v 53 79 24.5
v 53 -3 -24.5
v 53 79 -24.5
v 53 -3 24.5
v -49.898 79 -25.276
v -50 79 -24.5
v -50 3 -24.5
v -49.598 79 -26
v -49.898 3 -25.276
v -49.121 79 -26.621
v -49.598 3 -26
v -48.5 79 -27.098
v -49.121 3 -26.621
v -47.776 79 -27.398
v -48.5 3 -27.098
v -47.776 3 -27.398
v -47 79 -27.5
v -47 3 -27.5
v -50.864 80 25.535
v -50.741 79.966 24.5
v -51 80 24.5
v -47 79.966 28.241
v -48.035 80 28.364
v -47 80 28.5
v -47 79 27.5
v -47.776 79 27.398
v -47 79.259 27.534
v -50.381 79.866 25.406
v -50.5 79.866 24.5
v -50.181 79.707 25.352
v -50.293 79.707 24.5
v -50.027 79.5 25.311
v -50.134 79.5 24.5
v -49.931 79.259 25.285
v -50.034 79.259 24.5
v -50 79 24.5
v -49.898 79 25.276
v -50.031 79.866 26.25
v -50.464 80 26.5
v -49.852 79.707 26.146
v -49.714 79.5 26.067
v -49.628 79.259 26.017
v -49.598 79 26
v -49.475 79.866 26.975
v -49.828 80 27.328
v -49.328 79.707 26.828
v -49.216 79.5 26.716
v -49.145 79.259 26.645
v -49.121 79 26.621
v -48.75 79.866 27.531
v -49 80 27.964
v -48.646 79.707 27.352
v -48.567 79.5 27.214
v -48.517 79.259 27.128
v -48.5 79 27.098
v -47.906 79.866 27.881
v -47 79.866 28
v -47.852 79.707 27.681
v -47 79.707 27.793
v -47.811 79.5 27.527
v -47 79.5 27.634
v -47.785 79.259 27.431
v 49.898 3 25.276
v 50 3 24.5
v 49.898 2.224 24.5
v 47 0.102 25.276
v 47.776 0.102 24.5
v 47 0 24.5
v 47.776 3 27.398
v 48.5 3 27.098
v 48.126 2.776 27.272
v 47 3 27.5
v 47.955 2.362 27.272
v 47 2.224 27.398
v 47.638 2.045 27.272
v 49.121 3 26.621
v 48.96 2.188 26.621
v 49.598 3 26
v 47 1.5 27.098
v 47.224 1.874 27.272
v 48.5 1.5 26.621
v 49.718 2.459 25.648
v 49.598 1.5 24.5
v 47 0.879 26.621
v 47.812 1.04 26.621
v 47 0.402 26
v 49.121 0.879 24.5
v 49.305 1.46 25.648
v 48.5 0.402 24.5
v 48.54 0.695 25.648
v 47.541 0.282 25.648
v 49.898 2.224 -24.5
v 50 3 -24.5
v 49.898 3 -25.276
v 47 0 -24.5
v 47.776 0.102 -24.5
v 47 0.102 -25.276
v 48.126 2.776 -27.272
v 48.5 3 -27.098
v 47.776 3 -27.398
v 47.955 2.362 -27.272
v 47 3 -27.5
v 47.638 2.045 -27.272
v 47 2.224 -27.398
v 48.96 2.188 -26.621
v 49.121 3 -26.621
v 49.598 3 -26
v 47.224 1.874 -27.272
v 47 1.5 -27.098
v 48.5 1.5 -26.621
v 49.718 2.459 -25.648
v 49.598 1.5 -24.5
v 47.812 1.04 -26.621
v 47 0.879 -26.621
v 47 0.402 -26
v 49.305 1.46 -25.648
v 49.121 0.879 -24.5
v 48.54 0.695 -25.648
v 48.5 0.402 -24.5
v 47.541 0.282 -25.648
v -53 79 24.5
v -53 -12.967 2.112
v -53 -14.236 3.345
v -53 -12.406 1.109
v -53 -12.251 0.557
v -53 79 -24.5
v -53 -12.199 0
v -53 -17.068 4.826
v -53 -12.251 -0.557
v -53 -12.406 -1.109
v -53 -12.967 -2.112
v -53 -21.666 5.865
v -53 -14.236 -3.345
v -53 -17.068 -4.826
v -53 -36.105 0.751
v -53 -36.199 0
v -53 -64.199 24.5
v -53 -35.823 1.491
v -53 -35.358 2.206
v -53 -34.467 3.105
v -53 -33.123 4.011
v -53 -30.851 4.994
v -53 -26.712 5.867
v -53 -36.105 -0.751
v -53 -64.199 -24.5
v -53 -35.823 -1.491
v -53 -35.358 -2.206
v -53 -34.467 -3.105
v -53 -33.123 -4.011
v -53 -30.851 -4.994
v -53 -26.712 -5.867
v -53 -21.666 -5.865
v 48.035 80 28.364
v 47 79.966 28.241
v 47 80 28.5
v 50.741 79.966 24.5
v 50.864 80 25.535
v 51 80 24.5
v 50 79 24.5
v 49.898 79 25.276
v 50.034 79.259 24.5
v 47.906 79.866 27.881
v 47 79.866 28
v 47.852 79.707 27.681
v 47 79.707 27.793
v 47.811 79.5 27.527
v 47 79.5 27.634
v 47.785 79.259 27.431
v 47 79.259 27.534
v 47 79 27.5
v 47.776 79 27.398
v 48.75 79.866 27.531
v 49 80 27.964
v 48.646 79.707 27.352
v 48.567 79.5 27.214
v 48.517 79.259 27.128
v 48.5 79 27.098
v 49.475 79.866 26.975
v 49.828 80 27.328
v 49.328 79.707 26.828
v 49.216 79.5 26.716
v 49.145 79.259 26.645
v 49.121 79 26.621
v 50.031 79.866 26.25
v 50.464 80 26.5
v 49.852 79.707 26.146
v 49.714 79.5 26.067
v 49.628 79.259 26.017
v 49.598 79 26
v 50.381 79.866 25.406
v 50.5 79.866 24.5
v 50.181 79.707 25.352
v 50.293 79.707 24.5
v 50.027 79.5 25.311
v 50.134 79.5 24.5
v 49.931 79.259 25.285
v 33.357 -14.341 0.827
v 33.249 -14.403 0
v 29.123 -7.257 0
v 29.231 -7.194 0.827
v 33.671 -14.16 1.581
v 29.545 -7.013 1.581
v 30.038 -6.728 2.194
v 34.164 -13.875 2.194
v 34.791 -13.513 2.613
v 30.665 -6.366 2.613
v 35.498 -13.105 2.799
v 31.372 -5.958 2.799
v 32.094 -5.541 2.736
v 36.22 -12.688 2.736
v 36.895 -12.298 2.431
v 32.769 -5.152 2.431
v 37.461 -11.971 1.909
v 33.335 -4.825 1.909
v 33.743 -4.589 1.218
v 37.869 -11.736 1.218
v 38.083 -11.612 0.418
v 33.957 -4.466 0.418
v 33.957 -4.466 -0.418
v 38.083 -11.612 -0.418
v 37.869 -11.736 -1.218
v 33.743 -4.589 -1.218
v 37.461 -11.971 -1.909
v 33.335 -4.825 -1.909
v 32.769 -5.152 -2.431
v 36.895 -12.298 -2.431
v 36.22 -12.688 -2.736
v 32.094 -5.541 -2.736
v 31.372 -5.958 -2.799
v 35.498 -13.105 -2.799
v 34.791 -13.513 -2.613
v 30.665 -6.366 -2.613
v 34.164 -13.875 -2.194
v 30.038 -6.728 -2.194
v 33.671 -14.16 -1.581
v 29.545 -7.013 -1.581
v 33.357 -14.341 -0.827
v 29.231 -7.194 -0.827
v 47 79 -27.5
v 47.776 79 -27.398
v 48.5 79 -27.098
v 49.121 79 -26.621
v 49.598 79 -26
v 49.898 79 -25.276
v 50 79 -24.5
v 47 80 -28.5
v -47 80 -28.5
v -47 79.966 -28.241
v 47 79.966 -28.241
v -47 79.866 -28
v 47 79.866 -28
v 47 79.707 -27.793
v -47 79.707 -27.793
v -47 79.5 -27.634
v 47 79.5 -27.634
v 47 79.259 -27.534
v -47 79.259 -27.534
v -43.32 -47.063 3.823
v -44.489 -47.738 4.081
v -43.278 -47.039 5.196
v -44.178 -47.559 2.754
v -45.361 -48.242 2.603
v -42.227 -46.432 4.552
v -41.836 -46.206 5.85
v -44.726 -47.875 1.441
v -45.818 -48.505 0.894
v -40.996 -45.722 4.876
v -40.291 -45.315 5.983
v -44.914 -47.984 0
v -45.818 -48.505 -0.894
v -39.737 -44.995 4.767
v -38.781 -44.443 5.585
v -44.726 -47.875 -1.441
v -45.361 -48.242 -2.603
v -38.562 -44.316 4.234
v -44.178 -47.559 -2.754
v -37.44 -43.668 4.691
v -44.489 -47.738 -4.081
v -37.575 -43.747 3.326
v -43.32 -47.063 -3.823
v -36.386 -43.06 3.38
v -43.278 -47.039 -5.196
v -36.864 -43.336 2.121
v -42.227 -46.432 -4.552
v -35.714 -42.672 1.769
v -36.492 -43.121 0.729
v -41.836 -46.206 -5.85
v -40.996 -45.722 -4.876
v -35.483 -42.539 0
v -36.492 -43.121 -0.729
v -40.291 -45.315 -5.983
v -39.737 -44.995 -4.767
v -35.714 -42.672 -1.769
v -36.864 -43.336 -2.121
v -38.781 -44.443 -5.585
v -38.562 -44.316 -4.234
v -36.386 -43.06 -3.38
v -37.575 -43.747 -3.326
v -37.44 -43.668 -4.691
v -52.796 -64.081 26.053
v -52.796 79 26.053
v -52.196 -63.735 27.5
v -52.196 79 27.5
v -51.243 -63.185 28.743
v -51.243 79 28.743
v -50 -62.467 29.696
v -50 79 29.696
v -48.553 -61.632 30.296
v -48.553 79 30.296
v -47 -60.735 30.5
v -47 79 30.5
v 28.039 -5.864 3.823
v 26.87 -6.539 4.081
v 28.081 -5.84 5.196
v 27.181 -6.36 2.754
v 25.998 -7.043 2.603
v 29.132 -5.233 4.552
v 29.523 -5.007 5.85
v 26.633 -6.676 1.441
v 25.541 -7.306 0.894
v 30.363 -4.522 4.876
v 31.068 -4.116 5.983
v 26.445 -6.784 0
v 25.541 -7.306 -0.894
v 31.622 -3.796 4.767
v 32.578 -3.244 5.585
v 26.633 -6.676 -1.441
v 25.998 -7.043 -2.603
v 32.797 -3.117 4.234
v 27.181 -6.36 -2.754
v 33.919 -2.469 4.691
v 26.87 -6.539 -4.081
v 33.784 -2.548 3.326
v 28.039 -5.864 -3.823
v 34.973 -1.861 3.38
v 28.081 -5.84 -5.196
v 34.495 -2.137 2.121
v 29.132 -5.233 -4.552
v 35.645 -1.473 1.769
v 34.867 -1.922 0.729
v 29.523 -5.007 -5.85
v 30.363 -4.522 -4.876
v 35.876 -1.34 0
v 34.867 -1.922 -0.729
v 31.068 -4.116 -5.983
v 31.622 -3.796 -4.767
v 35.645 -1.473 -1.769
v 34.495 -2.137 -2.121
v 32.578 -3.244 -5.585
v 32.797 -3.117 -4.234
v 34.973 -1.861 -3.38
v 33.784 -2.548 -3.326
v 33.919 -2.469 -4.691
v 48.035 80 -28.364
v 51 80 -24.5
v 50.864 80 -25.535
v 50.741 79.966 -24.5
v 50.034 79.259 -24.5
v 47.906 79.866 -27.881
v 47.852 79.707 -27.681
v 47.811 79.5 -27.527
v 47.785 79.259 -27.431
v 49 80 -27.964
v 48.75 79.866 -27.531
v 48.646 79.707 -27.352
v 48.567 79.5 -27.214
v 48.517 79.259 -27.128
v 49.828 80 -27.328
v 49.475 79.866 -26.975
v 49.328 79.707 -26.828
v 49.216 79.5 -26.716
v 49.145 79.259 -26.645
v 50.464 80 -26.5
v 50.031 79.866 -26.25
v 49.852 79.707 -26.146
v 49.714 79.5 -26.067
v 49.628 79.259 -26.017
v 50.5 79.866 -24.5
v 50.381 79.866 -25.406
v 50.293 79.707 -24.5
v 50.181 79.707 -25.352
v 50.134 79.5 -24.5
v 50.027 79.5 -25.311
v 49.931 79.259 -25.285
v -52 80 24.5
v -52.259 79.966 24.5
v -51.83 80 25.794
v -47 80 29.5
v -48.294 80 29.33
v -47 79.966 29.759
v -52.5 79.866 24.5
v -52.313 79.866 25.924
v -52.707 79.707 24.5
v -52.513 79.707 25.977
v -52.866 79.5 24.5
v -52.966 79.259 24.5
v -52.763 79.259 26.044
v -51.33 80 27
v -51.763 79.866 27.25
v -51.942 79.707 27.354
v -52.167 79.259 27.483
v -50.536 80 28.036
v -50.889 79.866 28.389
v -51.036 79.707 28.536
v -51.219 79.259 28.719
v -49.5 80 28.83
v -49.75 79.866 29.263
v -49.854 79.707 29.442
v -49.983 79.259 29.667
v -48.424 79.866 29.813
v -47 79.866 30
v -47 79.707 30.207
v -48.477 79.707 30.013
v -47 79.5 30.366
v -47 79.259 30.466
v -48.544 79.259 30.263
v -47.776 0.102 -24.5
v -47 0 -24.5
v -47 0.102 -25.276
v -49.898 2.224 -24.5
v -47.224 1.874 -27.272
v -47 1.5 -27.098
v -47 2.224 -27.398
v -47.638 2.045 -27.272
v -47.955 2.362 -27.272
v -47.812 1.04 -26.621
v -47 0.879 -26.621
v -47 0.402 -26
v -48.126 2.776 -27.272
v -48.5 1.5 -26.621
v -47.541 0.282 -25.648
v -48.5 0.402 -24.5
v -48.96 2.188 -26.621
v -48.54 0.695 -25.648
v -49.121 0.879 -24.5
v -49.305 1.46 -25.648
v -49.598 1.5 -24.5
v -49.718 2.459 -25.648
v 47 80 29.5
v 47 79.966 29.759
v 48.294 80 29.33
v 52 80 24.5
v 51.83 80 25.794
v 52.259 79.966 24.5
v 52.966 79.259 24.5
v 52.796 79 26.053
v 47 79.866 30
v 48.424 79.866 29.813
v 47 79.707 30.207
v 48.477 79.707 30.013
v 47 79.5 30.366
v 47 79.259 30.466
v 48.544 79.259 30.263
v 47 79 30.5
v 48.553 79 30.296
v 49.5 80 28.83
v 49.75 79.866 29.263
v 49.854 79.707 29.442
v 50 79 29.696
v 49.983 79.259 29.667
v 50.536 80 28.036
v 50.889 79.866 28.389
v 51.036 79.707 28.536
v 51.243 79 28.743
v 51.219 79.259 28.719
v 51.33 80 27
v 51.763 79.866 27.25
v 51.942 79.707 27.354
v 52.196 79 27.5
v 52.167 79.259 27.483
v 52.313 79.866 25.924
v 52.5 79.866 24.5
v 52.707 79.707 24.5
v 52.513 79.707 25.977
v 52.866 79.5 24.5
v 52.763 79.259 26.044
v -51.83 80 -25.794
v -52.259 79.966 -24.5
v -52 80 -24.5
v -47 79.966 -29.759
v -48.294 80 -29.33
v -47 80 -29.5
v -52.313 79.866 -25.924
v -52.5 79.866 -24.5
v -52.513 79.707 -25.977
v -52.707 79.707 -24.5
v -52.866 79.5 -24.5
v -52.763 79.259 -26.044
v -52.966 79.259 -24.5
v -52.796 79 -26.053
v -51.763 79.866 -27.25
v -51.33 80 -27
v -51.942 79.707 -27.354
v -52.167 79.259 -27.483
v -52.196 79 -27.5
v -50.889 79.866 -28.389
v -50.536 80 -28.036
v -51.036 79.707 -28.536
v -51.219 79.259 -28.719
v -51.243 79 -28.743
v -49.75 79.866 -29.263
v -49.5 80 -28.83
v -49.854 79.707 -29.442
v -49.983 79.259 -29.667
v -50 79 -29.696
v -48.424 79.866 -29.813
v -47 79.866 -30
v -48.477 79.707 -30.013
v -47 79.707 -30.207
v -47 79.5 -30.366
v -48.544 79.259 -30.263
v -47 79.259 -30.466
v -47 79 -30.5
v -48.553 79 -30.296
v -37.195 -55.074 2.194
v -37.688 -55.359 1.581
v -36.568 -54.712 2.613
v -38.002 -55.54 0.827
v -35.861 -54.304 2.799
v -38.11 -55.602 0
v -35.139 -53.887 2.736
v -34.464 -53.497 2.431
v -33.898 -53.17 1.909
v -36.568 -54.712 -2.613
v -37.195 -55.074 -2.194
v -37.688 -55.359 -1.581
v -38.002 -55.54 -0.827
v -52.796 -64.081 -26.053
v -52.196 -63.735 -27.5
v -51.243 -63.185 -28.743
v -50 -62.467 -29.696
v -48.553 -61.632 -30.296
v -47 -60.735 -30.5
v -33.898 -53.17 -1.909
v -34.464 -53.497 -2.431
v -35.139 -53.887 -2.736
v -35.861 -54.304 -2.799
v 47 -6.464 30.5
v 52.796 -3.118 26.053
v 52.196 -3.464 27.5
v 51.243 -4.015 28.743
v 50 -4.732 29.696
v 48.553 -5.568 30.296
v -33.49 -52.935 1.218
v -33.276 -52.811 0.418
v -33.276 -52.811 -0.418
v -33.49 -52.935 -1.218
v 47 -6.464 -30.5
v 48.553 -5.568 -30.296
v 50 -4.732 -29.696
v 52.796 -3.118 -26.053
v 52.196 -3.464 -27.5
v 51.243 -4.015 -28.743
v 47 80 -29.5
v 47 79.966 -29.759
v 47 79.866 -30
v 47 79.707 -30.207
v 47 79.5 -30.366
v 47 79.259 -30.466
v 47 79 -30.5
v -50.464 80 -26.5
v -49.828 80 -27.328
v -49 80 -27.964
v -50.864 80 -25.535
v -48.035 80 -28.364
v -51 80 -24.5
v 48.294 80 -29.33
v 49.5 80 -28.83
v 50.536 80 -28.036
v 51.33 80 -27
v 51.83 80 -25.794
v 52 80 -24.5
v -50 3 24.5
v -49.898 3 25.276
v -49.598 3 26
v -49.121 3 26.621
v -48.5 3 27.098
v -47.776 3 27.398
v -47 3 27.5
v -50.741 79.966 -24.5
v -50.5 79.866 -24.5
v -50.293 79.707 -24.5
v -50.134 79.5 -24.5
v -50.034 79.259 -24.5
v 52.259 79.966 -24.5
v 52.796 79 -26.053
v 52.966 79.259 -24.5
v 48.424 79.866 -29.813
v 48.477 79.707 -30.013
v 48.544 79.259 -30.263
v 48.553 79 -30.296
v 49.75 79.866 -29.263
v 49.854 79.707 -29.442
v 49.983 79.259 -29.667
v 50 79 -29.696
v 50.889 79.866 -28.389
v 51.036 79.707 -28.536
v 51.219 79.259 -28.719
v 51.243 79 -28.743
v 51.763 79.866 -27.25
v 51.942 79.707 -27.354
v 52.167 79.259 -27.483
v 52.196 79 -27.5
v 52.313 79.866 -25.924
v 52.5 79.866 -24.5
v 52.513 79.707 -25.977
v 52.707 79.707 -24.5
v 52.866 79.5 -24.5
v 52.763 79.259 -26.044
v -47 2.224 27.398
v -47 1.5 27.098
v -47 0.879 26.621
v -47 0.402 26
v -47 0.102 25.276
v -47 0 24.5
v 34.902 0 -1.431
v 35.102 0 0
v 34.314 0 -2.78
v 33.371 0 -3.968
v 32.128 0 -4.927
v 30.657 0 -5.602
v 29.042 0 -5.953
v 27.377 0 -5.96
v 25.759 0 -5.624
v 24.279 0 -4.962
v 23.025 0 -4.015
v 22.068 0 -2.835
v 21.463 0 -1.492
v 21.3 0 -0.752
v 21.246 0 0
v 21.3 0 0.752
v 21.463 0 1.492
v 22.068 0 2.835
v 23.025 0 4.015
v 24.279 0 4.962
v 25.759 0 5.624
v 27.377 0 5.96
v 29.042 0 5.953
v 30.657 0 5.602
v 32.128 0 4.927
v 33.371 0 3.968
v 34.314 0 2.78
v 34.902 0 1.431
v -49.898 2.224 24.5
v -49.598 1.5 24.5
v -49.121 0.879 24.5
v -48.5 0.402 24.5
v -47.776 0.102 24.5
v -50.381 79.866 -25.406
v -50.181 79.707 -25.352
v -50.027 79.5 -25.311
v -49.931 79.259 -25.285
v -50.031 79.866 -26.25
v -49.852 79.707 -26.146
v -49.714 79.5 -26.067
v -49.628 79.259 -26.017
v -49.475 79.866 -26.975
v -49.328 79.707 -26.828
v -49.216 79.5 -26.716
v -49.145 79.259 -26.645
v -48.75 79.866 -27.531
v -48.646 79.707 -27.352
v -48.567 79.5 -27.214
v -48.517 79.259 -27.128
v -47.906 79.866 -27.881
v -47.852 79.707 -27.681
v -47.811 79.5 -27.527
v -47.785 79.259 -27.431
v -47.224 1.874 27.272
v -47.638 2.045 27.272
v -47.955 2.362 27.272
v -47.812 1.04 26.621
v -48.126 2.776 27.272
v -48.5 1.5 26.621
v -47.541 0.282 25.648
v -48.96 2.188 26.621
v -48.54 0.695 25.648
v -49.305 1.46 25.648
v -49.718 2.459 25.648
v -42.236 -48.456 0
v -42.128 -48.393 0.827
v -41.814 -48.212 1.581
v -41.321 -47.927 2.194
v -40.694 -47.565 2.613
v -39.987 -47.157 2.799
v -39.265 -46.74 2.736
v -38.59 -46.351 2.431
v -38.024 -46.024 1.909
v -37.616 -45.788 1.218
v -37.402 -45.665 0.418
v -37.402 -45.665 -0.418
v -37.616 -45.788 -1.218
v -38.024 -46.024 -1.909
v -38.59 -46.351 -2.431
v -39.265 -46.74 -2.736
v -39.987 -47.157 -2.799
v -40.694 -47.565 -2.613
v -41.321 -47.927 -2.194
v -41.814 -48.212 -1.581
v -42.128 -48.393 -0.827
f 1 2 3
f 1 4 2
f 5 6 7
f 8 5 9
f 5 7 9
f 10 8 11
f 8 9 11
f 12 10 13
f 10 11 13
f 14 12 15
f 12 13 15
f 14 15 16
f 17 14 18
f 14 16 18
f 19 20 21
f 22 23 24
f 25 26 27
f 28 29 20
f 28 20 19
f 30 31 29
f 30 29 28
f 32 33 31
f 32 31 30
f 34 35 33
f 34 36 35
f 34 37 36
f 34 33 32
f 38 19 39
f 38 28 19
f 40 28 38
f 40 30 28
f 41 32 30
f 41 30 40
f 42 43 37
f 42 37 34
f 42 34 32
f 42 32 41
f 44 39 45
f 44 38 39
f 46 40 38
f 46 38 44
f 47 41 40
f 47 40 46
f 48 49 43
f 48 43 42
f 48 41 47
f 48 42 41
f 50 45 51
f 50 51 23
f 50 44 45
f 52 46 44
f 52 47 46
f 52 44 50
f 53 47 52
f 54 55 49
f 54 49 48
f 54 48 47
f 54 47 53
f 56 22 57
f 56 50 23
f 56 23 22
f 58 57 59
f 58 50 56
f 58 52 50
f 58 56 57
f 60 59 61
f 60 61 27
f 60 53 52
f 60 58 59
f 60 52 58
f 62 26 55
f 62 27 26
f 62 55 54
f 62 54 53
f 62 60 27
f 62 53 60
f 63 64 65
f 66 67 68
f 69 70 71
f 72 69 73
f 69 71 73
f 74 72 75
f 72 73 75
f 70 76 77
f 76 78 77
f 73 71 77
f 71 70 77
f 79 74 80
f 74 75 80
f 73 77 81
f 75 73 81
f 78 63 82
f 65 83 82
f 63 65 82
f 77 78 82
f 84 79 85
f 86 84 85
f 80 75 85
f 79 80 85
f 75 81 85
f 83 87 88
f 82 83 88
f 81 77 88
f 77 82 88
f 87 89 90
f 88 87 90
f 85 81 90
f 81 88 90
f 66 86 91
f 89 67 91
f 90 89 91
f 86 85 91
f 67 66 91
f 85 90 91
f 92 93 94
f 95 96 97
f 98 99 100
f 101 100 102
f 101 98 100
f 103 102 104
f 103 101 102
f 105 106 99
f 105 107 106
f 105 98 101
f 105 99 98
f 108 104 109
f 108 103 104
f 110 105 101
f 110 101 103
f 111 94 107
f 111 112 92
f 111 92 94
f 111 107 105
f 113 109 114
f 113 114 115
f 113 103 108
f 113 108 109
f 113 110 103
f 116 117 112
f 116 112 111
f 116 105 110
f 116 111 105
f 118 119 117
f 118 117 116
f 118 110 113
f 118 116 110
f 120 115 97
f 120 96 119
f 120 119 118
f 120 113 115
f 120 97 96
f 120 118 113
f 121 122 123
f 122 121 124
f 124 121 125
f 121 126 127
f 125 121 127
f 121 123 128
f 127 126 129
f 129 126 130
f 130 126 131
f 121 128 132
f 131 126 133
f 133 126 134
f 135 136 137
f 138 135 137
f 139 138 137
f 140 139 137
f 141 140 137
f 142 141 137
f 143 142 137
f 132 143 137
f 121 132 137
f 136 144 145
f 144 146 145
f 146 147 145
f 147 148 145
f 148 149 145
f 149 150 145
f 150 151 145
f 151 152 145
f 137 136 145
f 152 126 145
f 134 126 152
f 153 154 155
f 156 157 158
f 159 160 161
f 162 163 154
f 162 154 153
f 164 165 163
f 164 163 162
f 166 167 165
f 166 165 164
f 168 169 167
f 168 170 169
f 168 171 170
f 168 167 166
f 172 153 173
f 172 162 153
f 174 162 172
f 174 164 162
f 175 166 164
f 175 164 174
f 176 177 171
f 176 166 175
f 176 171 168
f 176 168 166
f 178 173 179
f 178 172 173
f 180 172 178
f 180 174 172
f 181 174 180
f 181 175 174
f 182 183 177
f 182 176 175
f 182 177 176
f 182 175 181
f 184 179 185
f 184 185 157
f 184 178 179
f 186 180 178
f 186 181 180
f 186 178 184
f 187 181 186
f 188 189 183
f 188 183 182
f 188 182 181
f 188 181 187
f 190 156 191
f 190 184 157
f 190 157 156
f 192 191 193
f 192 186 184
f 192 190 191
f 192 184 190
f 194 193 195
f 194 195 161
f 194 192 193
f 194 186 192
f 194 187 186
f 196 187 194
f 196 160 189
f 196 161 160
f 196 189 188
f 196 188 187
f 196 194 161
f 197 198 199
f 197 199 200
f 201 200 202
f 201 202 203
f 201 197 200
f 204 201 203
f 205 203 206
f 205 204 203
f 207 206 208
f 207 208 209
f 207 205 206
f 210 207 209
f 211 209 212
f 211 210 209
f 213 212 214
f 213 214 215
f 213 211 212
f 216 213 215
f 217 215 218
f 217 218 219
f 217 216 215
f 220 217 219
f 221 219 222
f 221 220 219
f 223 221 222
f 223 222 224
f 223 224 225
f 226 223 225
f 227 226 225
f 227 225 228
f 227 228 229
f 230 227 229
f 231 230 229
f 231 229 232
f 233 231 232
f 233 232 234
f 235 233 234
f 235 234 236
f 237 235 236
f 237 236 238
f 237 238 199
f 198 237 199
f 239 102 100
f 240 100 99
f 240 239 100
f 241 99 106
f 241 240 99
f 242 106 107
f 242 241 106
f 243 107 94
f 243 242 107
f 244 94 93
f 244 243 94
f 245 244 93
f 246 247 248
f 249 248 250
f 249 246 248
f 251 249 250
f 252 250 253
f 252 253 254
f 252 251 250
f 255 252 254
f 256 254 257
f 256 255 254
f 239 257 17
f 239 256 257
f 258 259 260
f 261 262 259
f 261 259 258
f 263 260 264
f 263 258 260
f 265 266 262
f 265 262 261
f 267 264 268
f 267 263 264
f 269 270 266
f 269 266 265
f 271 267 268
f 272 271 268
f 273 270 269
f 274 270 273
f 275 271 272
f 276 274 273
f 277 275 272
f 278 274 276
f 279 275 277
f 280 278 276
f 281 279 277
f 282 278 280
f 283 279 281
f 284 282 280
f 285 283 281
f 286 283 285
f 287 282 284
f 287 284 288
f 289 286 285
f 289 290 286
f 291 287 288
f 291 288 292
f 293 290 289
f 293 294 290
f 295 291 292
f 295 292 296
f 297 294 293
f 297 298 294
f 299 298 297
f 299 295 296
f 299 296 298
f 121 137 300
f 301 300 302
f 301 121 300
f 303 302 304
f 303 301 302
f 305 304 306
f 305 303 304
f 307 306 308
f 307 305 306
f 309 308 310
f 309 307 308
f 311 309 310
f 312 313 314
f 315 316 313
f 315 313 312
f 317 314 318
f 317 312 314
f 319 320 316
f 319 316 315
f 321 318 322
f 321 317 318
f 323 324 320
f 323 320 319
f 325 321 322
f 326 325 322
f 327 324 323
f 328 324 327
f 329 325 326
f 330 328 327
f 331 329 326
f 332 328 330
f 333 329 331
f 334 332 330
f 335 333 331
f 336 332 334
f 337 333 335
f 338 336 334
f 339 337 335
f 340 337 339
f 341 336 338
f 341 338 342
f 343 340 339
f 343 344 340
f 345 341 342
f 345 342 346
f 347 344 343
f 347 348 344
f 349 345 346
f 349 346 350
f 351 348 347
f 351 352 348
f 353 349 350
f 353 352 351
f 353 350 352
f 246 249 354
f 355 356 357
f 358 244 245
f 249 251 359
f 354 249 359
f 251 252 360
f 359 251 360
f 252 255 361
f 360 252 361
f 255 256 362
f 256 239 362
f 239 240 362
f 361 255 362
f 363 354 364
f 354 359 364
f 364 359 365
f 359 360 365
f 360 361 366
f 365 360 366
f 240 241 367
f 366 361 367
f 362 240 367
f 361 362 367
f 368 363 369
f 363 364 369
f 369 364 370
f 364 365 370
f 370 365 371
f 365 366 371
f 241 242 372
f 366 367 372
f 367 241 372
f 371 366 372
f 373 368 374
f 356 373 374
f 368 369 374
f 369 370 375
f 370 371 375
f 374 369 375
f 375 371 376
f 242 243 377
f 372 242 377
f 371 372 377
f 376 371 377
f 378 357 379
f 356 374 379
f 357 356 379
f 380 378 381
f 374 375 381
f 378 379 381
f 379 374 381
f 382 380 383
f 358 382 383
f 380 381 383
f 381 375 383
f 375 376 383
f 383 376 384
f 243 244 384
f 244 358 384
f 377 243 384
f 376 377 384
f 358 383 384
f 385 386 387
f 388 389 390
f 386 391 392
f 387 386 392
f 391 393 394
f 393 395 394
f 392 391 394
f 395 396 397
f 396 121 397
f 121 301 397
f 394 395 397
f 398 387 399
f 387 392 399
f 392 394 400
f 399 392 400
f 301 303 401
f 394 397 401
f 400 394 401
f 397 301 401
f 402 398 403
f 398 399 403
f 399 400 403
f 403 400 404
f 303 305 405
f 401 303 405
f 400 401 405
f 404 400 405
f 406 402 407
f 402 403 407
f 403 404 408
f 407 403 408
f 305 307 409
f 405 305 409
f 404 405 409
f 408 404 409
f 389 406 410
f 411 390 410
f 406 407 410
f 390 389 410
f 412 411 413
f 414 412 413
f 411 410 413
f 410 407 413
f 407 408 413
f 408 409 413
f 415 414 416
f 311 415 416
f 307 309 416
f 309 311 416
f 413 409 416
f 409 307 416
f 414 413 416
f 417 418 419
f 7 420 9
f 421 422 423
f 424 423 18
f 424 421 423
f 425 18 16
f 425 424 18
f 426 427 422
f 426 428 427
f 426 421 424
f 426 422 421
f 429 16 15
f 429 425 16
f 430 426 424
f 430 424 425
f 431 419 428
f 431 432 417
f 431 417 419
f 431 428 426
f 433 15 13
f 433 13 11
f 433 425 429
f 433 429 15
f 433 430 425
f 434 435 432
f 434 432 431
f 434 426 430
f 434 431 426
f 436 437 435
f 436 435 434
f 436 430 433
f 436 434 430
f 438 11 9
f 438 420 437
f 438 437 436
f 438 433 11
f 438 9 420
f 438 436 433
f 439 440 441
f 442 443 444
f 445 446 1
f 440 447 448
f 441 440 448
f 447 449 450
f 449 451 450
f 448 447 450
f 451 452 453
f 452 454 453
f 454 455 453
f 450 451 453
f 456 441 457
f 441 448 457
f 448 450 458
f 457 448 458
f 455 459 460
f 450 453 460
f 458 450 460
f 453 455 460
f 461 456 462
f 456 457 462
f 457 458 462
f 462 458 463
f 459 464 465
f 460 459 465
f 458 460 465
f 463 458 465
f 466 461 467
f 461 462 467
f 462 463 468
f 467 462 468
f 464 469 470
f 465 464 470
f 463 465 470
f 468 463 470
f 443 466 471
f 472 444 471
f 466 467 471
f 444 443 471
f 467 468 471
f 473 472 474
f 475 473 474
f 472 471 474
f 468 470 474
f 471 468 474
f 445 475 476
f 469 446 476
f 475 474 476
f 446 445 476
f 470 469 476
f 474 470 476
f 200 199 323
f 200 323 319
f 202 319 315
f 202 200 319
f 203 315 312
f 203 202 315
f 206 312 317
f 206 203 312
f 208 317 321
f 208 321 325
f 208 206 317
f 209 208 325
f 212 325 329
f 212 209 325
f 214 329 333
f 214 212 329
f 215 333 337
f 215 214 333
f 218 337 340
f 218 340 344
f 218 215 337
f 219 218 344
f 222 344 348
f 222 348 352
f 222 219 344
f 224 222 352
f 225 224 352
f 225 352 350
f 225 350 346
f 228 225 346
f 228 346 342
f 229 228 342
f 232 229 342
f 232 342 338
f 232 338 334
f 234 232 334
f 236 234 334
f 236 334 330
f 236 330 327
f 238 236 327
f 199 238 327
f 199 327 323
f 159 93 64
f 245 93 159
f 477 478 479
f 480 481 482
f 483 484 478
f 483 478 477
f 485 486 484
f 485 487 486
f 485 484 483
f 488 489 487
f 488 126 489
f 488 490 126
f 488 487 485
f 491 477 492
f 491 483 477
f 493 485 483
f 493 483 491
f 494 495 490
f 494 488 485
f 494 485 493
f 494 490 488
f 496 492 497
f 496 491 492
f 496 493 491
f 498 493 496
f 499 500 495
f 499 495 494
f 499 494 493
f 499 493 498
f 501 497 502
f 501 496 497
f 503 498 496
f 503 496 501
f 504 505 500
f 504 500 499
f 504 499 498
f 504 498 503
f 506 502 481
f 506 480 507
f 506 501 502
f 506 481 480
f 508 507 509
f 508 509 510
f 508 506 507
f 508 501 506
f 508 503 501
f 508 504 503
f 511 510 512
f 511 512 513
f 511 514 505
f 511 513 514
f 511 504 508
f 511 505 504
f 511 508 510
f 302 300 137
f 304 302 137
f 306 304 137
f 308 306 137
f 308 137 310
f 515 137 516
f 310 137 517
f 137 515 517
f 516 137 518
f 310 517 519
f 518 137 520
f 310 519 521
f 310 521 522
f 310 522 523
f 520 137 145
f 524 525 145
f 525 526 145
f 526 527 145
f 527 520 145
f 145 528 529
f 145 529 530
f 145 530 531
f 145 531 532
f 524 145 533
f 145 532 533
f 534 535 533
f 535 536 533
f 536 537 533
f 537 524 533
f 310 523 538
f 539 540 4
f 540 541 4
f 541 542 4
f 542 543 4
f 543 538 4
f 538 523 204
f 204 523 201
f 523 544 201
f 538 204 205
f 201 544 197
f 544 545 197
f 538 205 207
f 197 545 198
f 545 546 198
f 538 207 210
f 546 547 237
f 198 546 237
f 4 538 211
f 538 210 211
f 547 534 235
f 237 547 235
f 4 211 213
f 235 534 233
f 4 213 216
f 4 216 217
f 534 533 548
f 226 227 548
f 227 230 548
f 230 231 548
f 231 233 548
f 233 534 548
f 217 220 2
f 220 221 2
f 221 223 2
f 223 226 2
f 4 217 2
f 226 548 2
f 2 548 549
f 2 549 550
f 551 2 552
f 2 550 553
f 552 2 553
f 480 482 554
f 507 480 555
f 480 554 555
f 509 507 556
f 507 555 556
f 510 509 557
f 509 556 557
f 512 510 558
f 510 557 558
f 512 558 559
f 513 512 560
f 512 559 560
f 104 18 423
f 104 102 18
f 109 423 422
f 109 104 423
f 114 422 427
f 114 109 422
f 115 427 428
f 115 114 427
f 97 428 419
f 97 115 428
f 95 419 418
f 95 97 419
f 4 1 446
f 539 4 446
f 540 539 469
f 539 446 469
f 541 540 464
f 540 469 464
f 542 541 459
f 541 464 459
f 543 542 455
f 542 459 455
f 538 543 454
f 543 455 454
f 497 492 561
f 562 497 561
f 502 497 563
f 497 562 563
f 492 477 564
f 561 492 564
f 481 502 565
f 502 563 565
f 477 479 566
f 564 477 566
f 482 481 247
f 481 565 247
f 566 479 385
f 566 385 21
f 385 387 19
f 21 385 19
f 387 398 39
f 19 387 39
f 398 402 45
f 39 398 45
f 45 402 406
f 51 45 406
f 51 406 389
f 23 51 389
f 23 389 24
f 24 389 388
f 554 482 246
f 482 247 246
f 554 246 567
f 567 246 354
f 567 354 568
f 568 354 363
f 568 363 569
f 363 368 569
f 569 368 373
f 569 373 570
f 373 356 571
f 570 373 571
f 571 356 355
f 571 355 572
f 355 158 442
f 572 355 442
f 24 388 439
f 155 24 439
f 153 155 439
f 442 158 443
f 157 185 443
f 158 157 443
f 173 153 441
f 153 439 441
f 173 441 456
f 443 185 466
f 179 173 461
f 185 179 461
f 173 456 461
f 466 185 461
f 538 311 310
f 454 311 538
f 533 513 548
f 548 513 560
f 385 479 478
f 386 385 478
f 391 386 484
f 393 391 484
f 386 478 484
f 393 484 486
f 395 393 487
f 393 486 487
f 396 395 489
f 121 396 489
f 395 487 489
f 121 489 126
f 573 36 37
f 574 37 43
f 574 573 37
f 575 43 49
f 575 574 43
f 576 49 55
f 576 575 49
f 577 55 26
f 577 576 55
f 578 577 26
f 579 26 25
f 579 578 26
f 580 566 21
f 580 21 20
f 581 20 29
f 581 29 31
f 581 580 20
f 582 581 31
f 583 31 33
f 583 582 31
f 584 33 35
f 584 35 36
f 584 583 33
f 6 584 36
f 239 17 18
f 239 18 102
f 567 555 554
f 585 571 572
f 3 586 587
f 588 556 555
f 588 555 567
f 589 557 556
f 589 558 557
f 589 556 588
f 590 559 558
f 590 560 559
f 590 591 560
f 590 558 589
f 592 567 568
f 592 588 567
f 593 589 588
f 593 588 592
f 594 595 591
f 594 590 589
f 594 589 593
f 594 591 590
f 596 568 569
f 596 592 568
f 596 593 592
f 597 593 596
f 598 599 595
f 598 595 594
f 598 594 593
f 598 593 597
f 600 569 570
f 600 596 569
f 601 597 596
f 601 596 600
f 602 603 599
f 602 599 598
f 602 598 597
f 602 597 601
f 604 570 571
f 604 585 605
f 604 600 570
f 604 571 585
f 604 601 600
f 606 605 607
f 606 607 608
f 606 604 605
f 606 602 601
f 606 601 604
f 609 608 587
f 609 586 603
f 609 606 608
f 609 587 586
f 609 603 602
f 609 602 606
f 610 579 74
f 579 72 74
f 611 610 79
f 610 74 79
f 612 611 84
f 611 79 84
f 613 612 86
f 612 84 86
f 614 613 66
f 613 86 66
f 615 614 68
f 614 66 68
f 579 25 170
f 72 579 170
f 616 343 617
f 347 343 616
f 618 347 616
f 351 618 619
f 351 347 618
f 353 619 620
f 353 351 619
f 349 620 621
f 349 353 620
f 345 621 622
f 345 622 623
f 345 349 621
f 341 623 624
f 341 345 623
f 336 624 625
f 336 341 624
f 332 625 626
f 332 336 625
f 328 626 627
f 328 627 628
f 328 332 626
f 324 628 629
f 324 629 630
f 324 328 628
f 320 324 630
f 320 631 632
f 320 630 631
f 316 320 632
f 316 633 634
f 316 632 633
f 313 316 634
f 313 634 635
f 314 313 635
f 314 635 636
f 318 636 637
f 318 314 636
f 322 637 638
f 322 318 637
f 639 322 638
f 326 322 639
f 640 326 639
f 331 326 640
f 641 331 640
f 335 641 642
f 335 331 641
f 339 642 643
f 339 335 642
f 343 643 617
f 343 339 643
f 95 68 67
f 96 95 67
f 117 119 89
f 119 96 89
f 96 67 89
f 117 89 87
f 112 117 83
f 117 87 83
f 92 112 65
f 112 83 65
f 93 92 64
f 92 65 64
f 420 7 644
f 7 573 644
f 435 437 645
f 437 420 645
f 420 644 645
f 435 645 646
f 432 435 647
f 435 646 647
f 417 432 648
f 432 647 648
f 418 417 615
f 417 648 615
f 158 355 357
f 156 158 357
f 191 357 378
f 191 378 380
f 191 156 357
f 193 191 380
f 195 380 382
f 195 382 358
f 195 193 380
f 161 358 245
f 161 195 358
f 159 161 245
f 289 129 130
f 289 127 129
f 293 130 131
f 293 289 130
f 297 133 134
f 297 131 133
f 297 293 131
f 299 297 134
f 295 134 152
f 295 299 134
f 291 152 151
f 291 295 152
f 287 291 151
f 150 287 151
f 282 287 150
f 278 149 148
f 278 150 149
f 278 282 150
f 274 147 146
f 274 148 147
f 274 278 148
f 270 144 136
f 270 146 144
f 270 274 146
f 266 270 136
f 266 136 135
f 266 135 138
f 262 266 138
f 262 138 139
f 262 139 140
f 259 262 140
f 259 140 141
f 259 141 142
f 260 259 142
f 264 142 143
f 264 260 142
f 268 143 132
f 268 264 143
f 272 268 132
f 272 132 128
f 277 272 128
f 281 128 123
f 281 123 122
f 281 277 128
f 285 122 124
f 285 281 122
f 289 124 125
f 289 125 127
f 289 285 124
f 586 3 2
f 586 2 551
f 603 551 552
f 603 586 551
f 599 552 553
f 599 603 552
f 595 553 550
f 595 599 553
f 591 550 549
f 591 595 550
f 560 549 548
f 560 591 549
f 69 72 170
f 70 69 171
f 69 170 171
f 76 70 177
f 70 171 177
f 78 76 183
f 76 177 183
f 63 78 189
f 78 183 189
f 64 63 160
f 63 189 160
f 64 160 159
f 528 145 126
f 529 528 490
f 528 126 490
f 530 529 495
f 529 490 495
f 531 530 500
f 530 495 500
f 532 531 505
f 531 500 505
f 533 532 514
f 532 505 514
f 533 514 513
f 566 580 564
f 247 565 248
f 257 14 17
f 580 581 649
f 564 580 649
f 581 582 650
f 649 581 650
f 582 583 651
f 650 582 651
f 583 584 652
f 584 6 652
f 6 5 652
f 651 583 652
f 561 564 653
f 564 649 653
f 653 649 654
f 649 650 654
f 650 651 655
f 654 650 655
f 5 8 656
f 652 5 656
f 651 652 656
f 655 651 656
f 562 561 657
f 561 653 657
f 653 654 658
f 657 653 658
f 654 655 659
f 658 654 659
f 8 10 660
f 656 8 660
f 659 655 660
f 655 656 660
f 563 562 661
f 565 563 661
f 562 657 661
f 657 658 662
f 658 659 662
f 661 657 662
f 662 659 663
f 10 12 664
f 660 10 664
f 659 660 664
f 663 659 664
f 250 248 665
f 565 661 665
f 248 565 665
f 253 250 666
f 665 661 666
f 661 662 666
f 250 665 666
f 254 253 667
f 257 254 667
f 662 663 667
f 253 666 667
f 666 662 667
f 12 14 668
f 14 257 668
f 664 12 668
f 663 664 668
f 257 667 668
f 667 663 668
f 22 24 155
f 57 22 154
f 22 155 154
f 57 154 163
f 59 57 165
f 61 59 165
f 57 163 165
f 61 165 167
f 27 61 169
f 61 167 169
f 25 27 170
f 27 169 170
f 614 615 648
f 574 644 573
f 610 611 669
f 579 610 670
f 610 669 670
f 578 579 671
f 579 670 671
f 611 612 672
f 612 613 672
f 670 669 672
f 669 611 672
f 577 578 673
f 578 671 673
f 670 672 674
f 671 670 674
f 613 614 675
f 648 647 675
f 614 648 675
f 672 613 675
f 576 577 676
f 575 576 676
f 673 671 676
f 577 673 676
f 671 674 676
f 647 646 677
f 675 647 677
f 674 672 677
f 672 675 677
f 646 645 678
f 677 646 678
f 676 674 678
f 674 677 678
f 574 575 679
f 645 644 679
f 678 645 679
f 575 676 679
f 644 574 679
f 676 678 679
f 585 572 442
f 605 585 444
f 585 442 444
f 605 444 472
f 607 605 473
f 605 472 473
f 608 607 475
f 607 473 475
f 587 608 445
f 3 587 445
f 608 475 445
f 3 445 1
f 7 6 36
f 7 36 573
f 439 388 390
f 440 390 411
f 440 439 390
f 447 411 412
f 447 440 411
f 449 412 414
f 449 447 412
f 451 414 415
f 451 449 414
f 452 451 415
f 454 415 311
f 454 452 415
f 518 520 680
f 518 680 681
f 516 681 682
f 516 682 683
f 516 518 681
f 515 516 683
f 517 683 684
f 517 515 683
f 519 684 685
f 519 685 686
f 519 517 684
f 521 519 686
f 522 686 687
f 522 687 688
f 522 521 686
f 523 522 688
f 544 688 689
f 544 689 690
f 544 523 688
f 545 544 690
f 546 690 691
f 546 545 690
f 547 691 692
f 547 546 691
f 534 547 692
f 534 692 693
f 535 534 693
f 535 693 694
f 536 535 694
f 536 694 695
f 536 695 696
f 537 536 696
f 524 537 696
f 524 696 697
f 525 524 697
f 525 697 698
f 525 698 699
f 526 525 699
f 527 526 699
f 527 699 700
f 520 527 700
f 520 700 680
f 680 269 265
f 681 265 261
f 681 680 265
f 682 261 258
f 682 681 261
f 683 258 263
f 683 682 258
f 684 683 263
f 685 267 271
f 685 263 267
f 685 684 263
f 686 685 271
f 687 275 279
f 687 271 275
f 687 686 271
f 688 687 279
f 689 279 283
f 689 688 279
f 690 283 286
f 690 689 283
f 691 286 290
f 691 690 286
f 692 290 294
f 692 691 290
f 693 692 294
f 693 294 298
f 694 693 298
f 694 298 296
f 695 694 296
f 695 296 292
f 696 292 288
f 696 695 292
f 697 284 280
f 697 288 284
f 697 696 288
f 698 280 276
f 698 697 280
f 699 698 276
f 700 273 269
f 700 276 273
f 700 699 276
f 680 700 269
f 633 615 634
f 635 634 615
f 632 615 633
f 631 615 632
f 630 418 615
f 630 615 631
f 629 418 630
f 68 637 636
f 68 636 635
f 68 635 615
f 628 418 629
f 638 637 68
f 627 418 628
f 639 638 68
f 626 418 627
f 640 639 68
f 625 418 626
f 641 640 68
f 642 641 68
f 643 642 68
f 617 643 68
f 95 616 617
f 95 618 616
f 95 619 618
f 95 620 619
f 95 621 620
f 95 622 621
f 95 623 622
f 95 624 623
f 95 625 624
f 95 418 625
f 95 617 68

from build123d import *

# Parameters (mm, degrees)
BOSS_EXTRUDE1_DEPTH                                = 27.5
SKETCH3_W                                          = 106
SKETCH3_H                                          = 83
CUT_EXTRUDE1_DEPTH                                 = 28.5
SKETCH4_W                                          = 106
SKETCH4_H                                          = 83
BOSS_EXTRUDE2_DEPTH                                = 3
BOSS_EXTRUDE3_DEPTH                                = 30.5
FILLET1_R                                          = 3
FILLET2_R                                          = 6
FILLET3_R                                          = 1
CUT_EXTRUDE3_START                                 = -10
SKETCH8_R                                          = 6
CUT_EXTRUDE3_DEPTH                                 = 115.880108514
CSK_FOR_10_FLAT_HEAD_MACHINE_SCREW_100_D           = 5.6134
CSK_FOR_10_FLAT_HEAD_MACHINE_SCREW_100_CSINK_D     = 9.779
CSK_FOR_10_FLAT_HEAD_MACHINE_SCREW_100_CSINK_ANGLE = 100


with BuildPart() as part:
    # Sketch1 → Boss-Extrude1 (new body, symmetric)
    with BuildSketch(Plane.XY):
        Polygon((-53, 80), (-50, 80), (-50, 0), (50, 0), (50, 80), (53, 80), (53, -3), (-53, -3), align=None)
    extrude(amount=BOSS_EXTRUDE1_DEPTH, both=True)

    # Sketch3 → Cut-Extrude1 (cut, through all)
    with BuildSketch(Plane.XY):
        with Locations((0, 38.5)):
            Rectangle(SKETCH3_W, SKETCH3_H)
    extrude(amount=-CUT_EXTRUDE1_DEPTH, mode=Mode.SUBTRACT)

    # Sketch4 → Boss-Extrude2 (add)
    with BuildSketch(Plane.XY.offset(27.5)):
        with Locations((0, 38.5)):
            Rectangle(SKETCH4_W, SKETCH4_H)
    extrude(amount=BOSS_EXTRUDE2_DEPTH)

    # Sketch5 → Boss-Extrude3 (add)
    with BuildSketch(Plane.XY.offset(30.5)):
        Polygon((-53, -3), (-53, -64.199128534), (53, -3), align=None)
    extrude(amount=-BOSS_EXTRUDE3_DEPTH)

    # Fillet1
    fillet1_edges = [part.edges().sort_by_distance(p)[0] for p in [
        (-50, 0, 13.75),
        (50, 0, 13.75),
        (50, 40, 27.5),
        (0, 0, 27.5),
        (-50, 40, 27.5),
    ]]
    fillet(fillet1_edges, radius=FILLET1_R)

    # Fillet2
    fillet2_edges = [part.edges().sort_by_distance(p)[0] for p in [
        (-53, 7.900435733, 30.5),
        (53, 38.5, 30.5),
    ]]
    fillet(fillet2_edges, radius=FILLET2_R)

    # Fillet3
    fillet3_edges = [part.edges().sort_by_distance(p)[0] for p in [
        (0, 80, 30.5),
        (-53, 80, 12.25),
        (53, 80, 12.25),
        (51.242640687, 80, 28.742640687),
        (-51.242640687, 80, 28.742640687),
        (0, 80, 27.5),
        (50, 80, 12.25),
        (-50, 80, 12.25),
        (49.121320344, 80, 26.621320344),
        (-49.121320344, 80, 26.621320344),
    ]]
    fillet(fillet3_edges, radius=FILLET3_R)

    # Sketch8 → Cut-Extrude3 (cut, through all)
    with BuildSketch(Plane(origin=(14.549038106, -25.1996732, 0), x_dir=(0.866025404, 0.5, 0), z_dir=(0.5, -0.866025404, 0)).offset(CUT_EXTRUDE3_START)):
        with Locations((-57.998910668, 0)):
            Circle(SKETCH8_R)
        with Locations((24.399346401, 0)):
            Circle(SKETCH8_R)
    extrude(amount=-CUT_EXTRUDE3_DEPTH, mode=Mode.SUBTRACT)

    # CSK for #10 Flat Head Machine Screw (100)2 (through all)
    with Locations(Plane(origin=(-40.679491924, -45.538874496, 0), x_dir=(0.866025404, 0.5, 0), z_dir=(-0.5, 0.866025404, 0))):
        with Locations((0, 0), (82.398257068, 0)):
            CounterSinkHole(CSK_FOR_10_FLAT_HEAD_MACHINE_SCREW_100_D / 2, CSK_FOR_10_FLAT_HEAD_MACHINE_SCREW_100_CSINK_D / 2, counter_sink_angle=CSK_FOR_10_FLAT_HEAD_MACHINE_SCREW_100_CSINK_ANGLE)

    # Mirror1: part across plane


with BuildPart() as part_1:
    add(part.part)
    add(part.part.mirror(Plane.XY))


solid = part_1.part
